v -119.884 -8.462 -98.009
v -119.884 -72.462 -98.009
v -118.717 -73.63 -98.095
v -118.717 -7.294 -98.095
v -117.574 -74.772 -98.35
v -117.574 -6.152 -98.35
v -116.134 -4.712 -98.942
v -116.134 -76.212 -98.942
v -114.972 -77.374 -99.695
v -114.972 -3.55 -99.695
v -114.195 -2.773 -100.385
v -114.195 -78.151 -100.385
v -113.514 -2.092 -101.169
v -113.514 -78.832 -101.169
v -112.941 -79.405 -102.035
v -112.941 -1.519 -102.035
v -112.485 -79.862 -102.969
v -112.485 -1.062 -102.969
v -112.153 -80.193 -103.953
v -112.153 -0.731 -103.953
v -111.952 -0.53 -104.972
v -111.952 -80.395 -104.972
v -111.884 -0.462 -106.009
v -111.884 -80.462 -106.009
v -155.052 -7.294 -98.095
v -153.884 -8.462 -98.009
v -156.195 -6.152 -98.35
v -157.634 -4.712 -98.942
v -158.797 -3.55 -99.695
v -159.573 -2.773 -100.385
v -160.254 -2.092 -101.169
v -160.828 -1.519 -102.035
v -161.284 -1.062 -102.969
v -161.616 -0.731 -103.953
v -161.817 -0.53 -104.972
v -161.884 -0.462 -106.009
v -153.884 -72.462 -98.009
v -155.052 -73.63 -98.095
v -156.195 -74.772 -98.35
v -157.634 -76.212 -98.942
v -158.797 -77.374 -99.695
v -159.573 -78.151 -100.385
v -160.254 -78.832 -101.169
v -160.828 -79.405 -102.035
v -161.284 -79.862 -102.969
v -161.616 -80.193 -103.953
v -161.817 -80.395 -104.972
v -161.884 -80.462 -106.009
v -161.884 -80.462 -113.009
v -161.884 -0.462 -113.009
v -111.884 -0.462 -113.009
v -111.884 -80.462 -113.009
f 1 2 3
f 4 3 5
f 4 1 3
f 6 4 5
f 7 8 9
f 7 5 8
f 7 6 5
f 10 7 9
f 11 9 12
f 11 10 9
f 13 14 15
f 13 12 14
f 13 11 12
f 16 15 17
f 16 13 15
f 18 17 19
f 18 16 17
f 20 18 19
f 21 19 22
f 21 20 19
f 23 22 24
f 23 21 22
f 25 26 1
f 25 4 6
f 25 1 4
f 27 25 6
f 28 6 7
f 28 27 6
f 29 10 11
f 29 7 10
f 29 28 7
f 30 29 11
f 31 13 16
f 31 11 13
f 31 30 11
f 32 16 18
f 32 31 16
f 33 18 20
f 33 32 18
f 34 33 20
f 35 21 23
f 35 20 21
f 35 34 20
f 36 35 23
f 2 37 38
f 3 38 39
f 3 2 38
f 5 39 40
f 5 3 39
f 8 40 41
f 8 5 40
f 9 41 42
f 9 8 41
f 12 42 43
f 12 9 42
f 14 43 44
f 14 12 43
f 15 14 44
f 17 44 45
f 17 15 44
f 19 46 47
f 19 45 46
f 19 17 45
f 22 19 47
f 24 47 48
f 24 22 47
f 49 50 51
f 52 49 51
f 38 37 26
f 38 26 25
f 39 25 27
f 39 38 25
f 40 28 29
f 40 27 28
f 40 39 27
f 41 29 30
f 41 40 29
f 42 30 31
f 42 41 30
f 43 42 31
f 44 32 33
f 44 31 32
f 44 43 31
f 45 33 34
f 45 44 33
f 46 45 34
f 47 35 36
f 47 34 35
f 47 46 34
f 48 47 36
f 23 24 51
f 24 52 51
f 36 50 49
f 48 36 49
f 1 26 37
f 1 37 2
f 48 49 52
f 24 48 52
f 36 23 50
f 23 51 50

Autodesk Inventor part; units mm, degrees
ref_plane "YZ Plane" through (0, 0, 0) normal (1, 0, 0) x (0, 1, 0)
ref_plane "XZ Plane" through (0, 0, 0) normal (0, 1, 0) x (-1, 0, 0)
ref_plane "XY Plane" through (0, 0, 0) normal (0, 0, 1) x (1, 0, 0)
ref_plane "Work Plane1" through (-136.8843, -40.4621, -113.009) normal (0, 0, 1) x (1, 0, 0)
sketch "Sketch1" plane through (-136.8843, -40.4621, -113.009) normal (0, 0, 1) x (1, 0, 0)
  line L0 (-25, -40) -> (25, -40)
  line L1 (25, -40) -> (25, 40)
  line L2 (25, 40) -> (-25, 40)
  line L3 (-25, 40) -> (-25, -40)
  line L4 (-25, -40) -> (25, 40) construction
  line L5 (25, -40) -> (-25, 40) construction
  point P0 (136.8843, 40.4621)
  point P1 (0, 0)
  dimension "d0" = 50
  dimension "d1" = 80
extrude "Extrusion1" add sketch "Sketch1" along normal blind 15
fillet "Fillet1" radius 8 4 edges at (-136.8843, -80.4621, -98.009) (-111.8843, -40.4621, -98.009) (-136.8843, -0.4621, -98.009) (-161.8843, -40.4621, -98.009)
properties part number "rubber padding"
